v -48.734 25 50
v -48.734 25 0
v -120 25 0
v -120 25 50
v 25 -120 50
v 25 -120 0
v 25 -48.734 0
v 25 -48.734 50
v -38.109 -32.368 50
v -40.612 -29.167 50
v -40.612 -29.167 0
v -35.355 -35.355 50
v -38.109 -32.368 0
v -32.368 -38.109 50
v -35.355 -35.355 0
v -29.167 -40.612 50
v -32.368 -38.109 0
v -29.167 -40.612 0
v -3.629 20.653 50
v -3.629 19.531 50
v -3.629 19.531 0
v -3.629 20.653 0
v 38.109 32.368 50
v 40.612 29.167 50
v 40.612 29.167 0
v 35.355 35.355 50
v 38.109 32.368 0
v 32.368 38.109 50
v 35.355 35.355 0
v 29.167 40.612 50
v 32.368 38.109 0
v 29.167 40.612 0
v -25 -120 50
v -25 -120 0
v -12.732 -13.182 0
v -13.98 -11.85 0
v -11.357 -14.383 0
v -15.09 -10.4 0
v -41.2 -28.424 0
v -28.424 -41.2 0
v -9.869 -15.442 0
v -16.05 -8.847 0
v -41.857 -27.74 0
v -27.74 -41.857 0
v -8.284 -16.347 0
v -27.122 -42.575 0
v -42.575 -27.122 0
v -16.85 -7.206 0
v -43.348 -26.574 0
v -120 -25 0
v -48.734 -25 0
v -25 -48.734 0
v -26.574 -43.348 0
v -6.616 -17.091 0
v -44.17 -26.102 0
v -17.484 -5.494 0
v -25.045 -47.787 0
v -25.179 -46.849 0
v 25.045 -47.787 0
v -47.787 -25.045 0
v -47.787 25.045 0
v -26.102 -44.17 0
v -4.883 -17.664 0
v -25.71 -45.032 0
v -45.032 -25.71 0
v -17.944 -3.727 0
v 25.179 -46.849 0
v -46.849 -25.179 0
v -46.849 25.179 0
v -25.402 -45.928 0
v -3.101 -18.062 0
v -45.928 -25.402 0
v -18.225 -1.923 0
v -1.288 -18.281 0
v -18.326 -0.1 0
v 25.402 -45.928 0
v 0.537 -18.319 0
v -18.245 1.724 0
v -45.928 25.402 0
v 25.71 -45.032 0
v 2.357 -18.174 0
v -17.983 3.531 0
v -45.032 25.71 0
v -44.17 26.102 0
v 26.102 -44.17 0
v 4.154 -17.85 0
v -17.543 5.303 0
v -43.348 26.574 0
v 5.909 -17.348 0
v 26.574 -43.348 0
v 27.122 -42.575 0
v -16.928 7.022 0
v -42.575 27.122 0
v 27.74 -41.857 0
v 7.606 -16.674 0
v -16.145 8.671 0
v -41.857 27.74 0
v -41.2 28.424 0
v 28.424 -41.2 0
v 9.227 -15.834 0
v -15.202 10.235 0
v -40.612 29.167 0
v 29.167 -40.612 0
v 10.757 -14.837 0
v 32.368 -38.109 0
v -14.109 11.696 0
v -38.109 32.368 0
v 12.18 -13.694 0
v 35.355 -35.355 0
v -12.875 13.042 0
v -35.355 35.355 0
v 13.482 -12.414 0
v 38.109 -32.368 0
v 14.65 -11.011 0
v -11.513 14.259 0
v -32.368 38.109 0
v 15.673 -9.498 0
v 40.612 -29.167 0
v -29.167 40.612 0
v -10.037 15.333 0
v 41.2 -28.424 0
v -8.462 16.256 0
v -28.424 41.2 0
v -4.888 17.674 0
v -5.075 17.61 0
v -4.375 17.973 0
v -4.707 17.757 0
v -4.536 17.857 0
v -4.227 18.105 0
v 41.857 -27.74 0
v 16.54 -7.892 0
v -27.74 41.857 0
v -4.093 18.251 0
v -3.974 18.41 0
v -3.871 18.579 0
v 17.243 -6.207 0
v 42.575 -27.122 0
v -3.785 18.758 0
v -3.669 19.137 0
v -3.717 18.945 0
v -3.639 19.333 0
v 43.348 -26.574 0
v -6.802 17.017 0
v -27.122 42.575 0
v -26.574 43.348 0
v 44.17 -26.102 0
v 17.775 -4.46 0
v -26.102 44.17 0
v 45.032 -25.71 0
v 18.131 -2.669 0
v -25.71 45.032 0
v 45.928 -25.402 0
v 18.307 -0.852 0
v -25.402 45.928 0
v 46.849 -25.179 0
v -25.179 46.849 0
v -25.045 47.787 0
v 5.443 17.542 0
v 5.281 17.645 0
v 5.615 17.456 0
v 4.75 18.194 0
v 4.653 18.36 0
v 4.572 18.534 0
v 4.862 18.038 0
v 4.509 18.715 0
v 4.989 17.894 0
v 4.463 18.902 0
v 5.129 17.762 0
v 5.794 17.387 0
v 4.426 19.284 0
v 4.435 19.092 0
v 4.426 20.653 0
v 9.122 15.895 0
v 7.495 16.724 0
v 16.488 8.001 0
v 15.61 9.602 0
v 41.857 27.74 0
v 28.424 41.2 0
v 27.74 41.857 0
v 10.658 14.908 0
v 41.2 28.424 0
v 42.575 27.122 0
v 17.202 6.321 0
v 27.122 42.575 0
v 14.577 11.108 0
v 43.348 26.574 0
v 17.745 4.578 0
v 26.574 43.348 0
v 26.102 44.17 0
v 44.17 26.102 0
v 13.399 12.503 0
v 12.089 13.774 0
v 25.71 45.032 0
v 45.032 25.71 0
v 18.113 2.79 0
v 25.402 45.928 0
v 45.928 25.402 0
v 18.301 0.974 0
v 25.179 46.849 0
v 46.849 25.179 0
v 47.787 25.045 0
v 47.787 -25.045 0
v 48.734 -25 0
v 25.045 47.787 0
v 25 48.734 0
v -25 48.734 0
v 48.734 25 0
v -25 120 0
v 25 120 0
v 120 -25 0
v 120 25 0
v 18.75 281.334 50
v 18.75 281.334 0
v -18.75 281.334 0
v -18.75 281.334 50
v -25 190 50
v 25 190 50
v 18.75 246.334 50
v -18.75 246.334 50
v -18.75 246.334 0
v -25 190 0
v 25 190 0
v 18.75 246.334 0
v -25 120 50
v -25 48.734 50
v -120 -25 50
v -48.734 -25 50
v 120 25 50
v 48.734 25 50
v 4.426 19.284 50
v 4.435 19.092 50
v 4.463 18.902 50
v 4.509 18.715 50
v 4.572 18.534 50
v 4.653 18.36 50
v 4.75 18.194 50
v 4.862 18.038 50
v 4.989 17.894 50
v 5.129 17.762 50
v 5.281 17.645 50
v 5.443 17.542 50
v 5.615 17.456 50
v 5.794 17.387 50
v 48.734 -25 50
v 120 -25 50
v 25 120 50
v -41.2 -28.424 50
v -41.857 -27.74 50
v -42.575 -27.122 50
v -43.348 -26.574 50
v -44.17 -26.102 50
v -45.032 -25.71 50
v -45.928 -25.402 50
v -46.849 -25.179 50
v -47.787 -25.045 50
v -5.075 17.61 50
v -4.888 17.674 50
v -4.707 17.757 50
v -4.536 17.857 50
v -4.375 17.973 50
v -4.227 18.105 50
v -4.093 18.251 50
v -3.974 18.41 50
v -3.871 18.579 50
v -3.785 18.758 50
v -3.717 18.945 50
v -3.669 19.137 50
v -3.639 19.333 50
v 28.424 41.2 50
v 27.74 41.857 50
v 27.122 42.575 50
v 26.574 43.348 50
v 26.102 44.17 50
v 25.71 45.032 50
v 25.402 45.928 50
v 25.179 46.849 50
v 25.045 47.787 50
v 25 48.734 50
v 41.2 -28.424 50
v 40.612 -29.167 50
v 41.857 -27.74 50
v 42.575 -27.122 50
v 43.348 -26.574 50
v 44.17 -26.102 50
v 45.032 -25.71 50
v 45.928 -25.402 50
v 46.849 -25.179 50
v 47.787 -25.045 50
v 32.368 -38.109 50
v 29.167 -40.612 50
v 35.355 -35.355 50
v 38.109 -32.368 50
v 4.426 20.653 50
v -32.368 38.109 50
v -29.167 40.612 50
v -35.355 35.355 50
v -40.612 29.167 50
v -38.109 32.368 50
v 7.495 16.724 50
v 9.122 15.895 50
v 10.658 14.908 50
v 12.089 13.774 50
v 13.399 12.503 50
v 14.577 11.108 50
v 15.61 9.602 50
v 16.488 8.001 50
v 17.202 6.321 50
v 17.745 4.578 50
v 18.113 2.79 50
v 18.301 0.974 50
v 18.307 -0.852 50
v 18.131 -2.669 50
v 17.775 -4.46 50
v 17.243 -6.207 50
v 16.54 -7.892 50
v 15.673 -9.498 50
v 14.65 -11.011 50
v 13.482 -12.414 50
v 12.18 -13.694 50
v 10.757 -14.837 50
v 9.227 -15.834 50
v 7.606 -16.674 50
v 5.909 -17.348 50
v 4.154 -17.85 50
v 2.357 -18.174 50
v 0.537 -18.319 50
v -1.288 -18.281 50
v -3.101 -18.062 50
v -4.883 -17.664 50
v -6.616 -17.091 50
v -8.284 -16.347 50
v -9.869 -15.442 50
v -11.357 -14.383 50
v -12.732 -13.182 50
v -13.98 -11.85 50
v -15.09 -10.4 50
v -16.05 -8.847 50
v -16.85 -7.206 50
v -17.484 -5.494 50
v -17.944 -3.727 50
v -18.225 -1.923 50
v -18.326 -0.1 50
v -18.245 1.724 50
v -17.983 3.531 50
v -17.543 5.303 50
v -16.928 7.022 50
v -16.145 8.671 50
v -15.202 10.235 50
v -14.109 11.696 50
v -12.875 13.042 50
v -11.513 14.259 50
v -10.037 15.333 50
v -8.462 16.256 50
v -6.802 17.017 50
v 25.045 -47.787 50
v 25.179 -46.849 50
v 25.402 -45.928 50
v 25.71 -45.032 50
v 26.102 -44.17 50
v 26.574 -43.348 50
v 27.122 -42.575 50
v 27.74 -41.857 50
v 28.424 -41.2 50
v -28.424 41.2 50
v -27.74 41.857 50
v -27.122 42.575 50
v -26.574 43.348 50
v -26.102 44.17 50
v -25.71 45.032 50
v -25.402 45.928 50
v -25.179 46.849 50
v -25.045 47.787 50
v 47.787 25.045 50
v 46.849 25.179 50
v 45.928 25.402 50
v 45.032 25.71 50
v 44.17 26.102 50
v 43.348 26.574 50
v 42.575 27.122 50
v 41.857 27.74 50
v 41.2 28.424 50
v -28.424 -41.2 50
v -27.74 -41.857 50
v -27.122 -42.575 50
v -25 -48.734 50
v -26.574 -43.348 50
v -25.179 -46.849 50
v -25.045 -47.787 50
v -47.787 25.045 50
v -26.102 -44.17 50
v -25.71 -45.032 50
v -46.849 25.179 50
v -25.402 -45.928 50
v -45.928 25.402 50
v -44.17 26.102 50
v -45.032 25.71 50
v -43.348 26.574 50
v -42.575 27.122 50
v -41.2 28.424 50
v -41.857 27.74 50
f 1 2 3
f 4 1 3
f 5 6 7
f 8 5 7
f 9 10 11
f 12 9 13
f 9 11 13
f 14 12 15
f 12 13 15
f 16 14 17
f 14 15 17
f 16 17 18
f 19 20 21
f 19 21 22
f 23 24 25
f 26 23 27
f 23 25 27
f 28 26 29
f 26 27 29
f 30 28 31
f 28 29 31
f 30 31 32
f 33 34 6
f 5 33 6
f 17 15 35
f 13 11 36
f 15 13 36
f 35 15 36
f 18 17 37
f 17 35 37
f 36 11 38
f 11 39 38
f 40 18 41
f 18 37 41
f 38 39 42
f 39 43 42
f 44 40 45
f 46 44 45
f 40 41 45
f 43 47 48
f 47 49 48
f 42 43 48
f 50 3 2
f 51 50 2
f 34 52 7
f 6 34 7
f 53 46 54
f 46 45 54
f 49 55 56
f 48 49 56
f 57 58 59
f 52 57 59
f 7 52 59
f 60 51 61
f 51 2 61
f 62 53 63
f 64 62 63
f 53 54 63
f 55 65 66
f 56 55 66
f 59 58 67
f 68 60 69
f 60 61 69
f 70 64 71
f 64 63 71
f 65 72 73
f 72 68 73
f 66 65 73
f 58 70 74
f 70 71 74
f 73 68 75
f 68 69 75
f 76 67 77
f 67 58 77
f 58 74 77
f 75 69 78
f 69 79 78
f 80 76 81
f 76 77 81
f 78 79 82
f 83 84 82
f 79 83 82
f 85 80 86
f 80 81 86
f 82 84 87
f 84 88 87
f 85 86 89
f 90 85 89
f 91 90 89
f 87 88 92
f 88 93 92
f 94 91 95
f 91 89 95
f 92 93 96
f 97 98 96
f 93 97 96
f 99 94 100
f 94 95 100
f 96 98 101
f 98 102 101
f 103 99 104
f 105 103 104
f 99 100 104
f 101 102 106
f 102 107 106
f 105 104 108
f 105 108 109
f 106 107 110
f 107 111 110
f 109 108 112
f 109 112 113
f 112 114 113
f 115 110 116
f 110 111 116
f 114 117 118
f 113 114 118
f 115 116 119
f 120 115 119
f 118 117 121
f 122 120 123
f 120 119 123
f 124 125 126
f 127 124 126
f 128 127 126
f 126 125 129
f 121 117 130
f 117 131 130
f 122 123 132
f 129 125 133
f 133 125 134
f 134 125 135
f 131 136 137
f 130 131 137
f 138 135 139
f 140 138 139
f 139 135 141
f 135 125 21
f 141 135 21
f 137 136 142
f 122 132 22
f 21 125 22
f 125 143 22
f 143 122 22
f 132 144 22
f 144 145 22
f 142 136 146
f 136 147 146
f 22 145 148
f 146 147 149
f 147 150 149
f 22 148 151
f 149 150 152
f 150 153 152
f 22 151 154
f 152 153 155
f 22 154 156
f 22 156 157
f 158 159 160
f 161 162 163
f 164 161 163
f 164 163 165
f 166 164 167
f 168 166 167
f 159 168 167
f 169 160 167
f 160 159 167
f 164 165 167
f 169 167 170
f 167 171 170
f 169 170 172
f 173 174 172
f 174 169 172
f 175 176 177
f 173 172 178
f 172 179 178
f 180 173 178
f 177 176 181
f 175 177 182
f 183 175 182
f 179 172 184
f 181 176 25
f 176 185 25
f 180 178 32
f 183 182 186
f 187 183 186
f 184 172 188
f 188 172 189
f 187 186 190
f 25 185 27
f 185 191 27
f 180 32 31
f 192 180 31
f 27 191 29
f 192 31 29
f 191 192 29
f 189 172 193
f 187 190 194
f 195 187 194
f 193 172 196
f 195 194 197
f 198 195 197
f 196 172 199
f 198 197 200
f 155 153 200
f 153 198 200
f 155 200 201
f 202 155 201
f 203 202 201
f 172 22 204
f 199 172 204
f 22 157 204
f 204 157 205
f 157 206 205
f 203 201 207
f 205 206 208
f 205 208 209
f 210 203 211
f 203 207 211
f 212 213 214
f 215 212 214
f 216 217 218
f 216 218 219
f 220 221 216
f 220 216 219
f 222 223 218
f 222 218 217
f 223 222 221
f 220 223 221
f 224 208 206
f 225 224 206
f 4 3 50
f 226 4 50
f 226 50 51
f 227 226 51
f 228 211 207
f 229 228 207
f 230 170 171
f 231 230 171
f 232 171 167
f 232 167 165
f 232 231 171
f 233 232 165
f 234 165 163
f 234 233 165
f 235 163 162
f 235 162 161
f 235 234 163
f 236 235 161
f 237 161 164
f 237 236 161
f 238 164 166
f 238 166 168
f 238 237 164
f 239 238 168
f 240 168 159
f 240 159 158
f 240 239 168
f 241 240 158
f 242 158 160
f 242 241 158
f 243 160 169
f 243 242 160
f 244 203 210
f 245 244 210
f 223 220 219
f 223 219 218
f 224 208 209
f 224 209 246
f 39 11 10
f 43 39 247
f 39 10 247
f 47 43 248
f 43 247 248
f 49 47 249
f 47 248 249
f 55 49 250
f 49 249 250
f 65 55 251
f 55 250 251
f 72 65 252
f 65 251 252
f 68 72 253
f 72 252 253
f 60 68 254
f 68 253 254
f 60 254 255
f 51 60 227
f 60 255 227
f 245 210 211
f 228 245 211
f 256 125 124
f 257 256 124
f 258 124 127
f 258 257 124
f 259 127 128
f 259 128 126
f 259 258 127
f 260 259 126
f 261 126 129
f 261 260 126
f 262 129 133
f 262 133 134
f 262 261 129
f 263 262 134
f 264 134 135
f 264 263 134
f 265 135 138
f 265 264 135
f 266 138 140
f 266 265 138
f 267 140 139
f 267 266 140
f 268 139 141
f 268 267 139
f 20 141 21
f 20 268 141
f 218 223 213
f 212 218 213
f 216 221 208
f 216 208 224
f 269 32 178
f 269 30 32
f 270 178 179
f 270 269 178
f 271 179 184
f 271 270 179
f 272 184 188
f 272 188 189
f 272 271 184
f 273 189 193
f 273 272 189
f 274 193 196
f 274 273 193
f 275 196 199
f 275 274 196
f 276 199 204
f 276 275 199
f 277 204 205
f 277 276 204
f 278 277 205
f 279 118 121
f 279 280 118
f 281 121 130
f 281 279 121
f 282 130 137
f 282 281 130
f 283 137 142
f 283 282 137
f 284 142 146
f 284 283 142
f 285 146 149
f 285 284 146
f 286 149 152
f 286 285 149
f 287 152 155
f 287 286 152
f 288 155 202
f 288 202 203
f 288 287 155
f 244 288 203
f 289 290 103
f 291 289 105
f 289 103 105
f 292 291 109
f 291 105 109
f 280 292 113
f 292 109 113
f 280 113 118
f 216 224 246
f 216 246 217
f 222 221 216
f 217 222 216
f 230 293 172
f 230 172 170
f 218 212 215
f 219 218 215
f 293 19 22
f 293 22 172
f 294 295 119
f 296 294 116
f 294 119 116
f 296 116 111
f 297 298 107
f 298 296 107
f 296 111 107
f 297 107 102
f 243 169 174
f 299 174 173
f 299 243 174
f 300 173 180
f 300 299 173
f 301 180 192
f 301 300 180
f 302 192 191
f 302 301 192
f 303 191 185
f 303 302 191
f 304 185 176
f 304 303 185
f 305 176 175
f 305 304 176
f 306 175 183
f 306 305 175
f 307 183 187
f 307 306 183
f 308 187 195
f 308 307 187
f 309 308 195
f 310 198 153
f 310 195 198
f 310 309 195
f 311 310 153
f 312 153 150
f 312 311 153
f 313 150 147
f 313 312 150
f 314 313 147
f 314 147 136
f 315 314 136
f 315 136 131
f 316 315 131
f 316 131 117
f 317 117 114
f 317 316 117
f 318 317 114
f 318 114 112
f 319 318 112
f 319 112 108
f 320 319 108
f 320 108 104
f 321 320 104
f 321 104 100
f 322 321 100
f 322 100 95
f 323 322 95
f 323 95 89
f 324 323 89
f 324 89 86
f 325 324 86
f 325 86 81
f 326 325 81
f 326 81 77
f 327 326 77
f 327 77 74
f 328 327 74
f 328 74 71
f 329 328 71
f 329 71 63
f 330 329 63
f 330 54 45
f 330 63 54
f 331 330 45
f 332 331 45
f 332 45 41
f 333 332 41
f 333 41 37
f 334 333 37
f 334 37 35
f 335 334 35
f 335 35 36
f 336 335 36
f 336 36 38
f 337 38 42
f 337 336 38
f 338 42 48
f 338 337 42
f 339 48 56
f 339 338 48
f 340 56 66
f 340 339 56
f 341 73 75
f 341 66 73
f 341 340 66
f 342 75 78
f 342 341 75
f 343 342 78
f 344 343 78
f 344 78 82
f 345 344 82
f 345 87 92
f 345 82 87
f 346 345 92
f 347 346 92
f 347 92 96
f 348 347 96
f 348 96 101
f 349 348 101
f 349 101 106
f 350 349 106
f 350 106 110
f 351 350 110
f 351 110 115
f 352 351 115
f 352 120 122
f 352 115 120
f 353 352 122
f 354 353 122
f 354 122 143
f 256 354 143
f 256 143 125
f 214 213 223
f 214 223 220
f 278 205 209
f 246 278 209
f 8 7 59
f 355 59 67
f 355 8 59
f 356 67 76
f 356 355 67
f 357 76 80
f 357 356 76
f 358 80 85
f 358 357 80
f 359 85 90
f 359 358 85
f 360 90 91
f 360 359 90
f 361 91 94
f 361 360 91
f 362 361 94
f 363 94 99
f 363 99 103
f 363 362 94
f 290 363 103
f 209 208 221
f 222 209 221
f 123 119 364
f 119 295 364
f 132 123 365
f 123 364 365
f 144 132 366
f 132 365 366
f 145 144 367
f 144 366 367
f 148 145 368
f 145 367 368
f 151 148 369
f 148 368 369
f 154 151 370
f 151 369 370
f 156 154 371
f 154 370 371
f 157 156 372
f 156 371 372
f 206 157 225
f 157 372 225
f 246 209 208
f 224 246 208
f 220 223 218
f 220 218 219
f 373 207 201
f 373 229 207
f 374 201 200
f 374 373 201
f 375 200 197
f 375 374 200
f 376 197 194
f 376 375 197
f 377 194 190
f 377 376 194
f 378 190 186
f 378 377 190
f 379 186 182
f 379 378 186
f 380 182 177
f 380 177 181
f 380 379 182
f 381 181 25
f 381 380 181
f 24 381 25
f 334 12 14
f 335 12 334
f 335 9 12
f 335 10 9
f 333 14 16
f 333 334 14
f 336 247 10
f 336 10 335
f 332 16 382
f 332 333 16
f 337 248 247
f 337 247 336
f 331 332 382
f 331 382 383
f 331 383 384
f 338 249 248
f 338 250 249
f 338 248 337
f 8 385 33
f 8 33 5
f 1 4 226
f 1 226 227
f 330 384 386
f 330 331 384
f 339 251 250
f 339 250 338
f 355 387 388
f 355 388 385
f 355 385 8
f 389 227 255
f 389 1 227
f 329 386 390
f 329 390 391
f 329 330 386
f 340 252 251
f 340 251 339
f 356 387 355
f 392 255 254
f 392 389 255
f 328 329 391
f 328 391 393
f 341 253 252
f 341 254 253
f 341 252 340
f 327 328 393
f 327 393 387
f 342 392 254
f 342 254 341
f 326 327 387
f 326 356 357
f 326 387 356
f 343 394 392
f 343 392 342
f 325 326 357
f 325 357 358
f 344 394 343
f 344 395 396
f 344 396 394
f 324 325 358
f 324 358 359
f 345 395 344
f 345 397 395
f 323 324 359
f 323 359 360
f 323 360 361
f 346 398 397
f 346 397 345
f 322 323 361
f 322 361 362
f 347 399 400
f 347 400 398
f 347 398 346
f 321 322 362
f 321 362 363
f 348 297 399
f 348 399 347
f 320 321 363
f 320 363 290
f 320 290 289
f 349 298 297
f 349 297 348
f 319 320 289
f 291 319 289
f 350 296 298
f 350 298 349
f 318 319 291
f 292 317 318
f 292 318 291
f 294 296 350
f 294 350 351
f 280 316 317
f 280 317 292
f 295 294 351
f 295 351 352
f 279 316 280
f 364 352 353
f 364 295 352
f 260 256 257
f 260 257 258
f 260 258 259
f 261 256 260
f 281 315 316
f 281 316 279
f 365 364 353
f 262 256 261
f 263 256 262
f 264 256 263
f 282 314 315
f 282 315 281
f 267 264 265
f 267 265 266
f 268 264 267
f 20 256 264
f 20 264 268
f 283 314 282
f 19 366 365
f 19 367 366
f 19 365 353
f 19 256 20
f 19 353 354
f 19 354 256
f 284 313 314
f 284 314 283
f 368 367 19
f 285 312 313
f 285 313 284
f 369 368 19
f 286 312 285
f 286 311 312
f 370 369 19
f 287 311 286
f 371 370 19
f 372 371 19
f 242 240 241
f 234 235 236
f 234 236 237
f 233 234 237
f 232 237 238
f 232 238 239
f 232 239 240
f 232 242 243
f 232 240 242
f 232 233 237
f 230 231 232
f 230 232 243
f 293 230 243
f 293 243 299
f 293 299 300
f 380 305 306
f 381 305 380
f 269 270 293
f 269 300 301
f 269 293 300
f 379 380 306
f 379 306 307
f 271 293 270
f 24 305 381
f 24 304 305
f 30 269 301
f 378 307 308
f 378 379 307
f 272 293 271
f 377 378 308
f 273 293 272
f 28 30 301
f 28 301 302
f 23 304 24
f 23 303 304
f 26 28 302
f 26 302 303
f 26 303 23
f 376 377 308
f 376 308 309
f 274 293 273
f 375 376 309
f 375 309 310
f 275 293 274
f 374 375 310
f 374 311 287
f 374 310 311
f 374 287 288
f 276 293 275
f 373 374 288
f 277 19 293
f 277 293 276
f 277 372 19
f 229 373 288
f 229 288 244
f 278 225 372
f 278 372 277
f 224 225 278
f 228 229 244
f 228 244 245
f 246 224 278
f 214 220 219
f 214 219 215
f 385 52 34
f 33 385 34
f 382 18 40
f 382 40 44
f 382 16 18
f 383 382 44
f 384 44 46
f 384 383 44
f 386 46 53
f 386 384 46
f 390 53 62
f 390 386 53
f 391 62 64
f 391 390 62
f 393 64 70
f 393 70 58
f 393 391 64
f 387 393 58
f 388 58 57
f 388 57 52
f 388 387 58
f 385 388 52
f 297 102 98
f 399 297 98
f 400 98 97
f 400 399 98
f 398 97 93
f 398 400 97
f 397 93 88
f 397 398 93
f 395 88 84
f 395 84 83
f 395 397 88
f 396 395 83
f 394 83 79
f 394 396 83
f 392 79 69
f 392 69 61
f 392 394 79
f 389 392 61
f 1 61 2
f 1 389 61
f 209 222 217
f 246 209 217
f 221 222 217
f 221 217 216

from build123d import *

# Parameters (mm, degrees)
SKETCH2_R                = 50
BOSS_EXTRUDE1_DEPTH      = 50
BOSS_EXTRUDE2_DEPTH      = 50
FILLET1_R                = 10
CIRPATTERN1_COUNT        = 4
FILLET1_OF_CIRPATTERN1_R = 10
CUT_EXTRUDE1_DEPTH       = 177.91806013
SKETCH11_W               = 50
SKETCH11_H               = 70
BOSS_EXTRUDE7_DEPTH      = 50
BOSS_EXTRUDE8_DEPTH      = 50
SKETCH14_W               = 37.5
SKETCH14_H               = 35
BOSS_EXTRUDE9_DEPTH      = 50


with BuildPart() as part:
    # Sketch2 → Boss-Extrude1 (new body)
    with BuildSketch(Plane.XY):
        Circle(SKETCH2_R)
    extrude(amount=BOSS_EXTRUDE1_DEPTH)

    # Sketch2<3> → Boss-Extrude2 (add)
    with BuildSketch(Plane.XY):
        with BuildLine():
            ThreePointArc((-43.301270189, -25), (-48.296291314, -12.940952255), (-50, 0))
            ThreePointArc((-50, 0), (-48.296291314, 12.940952255), (-43.301270189, 25))
            Line((-43.301270189, 25), (-120, 25))
            Line((-120, 25), (-120, -25))
            Line((-120, -25), (-43.301270189, -25))
        make_face()
    boss_extrude2 = extrude(amount=BOSS_EXTRUDE2_DEPTH)

    # Fillet1
    fillet1_edges = [part.edges().sort_by_distance(p)[0] for p in [
        (-43.301270189, 25, 25),
        (-43.301270189, -25, 25),
    ]]
    fillet(fillet1_edges, radius=FILLET1_R)

    # CirPattern1: Boss-Extrude2 ×4 about axis
    cirpattern1_axis = Axis((0, 0, 0), (0, 0, 1))
    for i in range(1, CIRPATTERN1_COUNT):
        add(boss_extrude2.rotate(cirpattern1_axis, i * 360 / CIRPATTERN1_COUNT))

    # Fillet1 of CirPattern1
    fillet1_of_cirpattern1_edges = [part.edges().sort_by_distance(p)[0] for p in [
        (-25, -43.301270189, 25),
        (25, -43.301270189, 25),
        (43.301270189, -25, 25),
        (43.301270189, 25, 25),
        (25, 43.301270189, 25),
        (-25, 43.301270189, 25),
    ]]
    fillet(fillet1_of_cirpattern1_edges, radius=FILLET1_OF_CIRPATTERN1_R)

    # Sketch3 → Cut-Extrude1 (cut, through all)
    with BuildSketch(Plane.XY.offset(50)):
        with BuildLine():
            Line((-3.629295483, 19.531446755), (-3.629295483, 20.653397312))
            Line((-3.629295483, 20.653397312), (4.42625265, 20.653397312))
            Line((4.42625265, 20.653397312), (4.42625265, 19.283922238))
            ThreePointArc((4.42625265, 19.283922238), (4.803815258, 18.114436492), (5.79394956, 17.386504834))
            ThreePointArc((5.79394956, 17.386504834), (-0.376200303, -18.322632867), (-5.075407996, 17.609674487))
            ThreePointArc((-5.075407996, 17.609674487), (-4.031206785, 18.328902572), (-3.629295483, 19.531446755))
        make_face()
    extrude(amount=-CUT_EXTRUDE1_DEPTH, mode=Mode.SUBTRACT)


with BuildPart() as body_2:
    # Sketch11 → Boss-Extrude7 (new body)
    with BuildSketch(Plane.ZY.offset(25)):
        with Locations((25, 155)):
            Rectangle(SKETCH11_W, SKETCH11_H)
    extrude(amount=-BOSS_EXTRUDE7_DEPTH)


with BuildPart() as body_3:
    # Sketch13 → Boss-Extrude8 (new body)
    with BuildSketch(Plane(origin=(0, 0, 0), x_dir=(-1, 0, 0), z_dir=(0, 0, -1))):
        Polygon((-25, 190), (25, 190), (18.75, 246.334032592), (-18.75, 246.334032592), align=None)
    extrude(amount=-BOSS_EXTRUDE8_DEPTH)


with BuildPart() as body_4:
    # Sketch14 → Boss-Extrude9 (new body)
    with BuildSketch(Plane(origin=(0, 0, 0), x_dir=(-1, 0, 0), z_dir=(0, 0, -1))):
        with Locations((0, 263.834032592)):
            Rectangle(SKETCH14_W, SKETCH14_H)
    extrude(amount=-BOSS_EXTRUDE9_DEPTH)


solid = Compound([part.part, body_2.part, body_3.part, body_4.part])
